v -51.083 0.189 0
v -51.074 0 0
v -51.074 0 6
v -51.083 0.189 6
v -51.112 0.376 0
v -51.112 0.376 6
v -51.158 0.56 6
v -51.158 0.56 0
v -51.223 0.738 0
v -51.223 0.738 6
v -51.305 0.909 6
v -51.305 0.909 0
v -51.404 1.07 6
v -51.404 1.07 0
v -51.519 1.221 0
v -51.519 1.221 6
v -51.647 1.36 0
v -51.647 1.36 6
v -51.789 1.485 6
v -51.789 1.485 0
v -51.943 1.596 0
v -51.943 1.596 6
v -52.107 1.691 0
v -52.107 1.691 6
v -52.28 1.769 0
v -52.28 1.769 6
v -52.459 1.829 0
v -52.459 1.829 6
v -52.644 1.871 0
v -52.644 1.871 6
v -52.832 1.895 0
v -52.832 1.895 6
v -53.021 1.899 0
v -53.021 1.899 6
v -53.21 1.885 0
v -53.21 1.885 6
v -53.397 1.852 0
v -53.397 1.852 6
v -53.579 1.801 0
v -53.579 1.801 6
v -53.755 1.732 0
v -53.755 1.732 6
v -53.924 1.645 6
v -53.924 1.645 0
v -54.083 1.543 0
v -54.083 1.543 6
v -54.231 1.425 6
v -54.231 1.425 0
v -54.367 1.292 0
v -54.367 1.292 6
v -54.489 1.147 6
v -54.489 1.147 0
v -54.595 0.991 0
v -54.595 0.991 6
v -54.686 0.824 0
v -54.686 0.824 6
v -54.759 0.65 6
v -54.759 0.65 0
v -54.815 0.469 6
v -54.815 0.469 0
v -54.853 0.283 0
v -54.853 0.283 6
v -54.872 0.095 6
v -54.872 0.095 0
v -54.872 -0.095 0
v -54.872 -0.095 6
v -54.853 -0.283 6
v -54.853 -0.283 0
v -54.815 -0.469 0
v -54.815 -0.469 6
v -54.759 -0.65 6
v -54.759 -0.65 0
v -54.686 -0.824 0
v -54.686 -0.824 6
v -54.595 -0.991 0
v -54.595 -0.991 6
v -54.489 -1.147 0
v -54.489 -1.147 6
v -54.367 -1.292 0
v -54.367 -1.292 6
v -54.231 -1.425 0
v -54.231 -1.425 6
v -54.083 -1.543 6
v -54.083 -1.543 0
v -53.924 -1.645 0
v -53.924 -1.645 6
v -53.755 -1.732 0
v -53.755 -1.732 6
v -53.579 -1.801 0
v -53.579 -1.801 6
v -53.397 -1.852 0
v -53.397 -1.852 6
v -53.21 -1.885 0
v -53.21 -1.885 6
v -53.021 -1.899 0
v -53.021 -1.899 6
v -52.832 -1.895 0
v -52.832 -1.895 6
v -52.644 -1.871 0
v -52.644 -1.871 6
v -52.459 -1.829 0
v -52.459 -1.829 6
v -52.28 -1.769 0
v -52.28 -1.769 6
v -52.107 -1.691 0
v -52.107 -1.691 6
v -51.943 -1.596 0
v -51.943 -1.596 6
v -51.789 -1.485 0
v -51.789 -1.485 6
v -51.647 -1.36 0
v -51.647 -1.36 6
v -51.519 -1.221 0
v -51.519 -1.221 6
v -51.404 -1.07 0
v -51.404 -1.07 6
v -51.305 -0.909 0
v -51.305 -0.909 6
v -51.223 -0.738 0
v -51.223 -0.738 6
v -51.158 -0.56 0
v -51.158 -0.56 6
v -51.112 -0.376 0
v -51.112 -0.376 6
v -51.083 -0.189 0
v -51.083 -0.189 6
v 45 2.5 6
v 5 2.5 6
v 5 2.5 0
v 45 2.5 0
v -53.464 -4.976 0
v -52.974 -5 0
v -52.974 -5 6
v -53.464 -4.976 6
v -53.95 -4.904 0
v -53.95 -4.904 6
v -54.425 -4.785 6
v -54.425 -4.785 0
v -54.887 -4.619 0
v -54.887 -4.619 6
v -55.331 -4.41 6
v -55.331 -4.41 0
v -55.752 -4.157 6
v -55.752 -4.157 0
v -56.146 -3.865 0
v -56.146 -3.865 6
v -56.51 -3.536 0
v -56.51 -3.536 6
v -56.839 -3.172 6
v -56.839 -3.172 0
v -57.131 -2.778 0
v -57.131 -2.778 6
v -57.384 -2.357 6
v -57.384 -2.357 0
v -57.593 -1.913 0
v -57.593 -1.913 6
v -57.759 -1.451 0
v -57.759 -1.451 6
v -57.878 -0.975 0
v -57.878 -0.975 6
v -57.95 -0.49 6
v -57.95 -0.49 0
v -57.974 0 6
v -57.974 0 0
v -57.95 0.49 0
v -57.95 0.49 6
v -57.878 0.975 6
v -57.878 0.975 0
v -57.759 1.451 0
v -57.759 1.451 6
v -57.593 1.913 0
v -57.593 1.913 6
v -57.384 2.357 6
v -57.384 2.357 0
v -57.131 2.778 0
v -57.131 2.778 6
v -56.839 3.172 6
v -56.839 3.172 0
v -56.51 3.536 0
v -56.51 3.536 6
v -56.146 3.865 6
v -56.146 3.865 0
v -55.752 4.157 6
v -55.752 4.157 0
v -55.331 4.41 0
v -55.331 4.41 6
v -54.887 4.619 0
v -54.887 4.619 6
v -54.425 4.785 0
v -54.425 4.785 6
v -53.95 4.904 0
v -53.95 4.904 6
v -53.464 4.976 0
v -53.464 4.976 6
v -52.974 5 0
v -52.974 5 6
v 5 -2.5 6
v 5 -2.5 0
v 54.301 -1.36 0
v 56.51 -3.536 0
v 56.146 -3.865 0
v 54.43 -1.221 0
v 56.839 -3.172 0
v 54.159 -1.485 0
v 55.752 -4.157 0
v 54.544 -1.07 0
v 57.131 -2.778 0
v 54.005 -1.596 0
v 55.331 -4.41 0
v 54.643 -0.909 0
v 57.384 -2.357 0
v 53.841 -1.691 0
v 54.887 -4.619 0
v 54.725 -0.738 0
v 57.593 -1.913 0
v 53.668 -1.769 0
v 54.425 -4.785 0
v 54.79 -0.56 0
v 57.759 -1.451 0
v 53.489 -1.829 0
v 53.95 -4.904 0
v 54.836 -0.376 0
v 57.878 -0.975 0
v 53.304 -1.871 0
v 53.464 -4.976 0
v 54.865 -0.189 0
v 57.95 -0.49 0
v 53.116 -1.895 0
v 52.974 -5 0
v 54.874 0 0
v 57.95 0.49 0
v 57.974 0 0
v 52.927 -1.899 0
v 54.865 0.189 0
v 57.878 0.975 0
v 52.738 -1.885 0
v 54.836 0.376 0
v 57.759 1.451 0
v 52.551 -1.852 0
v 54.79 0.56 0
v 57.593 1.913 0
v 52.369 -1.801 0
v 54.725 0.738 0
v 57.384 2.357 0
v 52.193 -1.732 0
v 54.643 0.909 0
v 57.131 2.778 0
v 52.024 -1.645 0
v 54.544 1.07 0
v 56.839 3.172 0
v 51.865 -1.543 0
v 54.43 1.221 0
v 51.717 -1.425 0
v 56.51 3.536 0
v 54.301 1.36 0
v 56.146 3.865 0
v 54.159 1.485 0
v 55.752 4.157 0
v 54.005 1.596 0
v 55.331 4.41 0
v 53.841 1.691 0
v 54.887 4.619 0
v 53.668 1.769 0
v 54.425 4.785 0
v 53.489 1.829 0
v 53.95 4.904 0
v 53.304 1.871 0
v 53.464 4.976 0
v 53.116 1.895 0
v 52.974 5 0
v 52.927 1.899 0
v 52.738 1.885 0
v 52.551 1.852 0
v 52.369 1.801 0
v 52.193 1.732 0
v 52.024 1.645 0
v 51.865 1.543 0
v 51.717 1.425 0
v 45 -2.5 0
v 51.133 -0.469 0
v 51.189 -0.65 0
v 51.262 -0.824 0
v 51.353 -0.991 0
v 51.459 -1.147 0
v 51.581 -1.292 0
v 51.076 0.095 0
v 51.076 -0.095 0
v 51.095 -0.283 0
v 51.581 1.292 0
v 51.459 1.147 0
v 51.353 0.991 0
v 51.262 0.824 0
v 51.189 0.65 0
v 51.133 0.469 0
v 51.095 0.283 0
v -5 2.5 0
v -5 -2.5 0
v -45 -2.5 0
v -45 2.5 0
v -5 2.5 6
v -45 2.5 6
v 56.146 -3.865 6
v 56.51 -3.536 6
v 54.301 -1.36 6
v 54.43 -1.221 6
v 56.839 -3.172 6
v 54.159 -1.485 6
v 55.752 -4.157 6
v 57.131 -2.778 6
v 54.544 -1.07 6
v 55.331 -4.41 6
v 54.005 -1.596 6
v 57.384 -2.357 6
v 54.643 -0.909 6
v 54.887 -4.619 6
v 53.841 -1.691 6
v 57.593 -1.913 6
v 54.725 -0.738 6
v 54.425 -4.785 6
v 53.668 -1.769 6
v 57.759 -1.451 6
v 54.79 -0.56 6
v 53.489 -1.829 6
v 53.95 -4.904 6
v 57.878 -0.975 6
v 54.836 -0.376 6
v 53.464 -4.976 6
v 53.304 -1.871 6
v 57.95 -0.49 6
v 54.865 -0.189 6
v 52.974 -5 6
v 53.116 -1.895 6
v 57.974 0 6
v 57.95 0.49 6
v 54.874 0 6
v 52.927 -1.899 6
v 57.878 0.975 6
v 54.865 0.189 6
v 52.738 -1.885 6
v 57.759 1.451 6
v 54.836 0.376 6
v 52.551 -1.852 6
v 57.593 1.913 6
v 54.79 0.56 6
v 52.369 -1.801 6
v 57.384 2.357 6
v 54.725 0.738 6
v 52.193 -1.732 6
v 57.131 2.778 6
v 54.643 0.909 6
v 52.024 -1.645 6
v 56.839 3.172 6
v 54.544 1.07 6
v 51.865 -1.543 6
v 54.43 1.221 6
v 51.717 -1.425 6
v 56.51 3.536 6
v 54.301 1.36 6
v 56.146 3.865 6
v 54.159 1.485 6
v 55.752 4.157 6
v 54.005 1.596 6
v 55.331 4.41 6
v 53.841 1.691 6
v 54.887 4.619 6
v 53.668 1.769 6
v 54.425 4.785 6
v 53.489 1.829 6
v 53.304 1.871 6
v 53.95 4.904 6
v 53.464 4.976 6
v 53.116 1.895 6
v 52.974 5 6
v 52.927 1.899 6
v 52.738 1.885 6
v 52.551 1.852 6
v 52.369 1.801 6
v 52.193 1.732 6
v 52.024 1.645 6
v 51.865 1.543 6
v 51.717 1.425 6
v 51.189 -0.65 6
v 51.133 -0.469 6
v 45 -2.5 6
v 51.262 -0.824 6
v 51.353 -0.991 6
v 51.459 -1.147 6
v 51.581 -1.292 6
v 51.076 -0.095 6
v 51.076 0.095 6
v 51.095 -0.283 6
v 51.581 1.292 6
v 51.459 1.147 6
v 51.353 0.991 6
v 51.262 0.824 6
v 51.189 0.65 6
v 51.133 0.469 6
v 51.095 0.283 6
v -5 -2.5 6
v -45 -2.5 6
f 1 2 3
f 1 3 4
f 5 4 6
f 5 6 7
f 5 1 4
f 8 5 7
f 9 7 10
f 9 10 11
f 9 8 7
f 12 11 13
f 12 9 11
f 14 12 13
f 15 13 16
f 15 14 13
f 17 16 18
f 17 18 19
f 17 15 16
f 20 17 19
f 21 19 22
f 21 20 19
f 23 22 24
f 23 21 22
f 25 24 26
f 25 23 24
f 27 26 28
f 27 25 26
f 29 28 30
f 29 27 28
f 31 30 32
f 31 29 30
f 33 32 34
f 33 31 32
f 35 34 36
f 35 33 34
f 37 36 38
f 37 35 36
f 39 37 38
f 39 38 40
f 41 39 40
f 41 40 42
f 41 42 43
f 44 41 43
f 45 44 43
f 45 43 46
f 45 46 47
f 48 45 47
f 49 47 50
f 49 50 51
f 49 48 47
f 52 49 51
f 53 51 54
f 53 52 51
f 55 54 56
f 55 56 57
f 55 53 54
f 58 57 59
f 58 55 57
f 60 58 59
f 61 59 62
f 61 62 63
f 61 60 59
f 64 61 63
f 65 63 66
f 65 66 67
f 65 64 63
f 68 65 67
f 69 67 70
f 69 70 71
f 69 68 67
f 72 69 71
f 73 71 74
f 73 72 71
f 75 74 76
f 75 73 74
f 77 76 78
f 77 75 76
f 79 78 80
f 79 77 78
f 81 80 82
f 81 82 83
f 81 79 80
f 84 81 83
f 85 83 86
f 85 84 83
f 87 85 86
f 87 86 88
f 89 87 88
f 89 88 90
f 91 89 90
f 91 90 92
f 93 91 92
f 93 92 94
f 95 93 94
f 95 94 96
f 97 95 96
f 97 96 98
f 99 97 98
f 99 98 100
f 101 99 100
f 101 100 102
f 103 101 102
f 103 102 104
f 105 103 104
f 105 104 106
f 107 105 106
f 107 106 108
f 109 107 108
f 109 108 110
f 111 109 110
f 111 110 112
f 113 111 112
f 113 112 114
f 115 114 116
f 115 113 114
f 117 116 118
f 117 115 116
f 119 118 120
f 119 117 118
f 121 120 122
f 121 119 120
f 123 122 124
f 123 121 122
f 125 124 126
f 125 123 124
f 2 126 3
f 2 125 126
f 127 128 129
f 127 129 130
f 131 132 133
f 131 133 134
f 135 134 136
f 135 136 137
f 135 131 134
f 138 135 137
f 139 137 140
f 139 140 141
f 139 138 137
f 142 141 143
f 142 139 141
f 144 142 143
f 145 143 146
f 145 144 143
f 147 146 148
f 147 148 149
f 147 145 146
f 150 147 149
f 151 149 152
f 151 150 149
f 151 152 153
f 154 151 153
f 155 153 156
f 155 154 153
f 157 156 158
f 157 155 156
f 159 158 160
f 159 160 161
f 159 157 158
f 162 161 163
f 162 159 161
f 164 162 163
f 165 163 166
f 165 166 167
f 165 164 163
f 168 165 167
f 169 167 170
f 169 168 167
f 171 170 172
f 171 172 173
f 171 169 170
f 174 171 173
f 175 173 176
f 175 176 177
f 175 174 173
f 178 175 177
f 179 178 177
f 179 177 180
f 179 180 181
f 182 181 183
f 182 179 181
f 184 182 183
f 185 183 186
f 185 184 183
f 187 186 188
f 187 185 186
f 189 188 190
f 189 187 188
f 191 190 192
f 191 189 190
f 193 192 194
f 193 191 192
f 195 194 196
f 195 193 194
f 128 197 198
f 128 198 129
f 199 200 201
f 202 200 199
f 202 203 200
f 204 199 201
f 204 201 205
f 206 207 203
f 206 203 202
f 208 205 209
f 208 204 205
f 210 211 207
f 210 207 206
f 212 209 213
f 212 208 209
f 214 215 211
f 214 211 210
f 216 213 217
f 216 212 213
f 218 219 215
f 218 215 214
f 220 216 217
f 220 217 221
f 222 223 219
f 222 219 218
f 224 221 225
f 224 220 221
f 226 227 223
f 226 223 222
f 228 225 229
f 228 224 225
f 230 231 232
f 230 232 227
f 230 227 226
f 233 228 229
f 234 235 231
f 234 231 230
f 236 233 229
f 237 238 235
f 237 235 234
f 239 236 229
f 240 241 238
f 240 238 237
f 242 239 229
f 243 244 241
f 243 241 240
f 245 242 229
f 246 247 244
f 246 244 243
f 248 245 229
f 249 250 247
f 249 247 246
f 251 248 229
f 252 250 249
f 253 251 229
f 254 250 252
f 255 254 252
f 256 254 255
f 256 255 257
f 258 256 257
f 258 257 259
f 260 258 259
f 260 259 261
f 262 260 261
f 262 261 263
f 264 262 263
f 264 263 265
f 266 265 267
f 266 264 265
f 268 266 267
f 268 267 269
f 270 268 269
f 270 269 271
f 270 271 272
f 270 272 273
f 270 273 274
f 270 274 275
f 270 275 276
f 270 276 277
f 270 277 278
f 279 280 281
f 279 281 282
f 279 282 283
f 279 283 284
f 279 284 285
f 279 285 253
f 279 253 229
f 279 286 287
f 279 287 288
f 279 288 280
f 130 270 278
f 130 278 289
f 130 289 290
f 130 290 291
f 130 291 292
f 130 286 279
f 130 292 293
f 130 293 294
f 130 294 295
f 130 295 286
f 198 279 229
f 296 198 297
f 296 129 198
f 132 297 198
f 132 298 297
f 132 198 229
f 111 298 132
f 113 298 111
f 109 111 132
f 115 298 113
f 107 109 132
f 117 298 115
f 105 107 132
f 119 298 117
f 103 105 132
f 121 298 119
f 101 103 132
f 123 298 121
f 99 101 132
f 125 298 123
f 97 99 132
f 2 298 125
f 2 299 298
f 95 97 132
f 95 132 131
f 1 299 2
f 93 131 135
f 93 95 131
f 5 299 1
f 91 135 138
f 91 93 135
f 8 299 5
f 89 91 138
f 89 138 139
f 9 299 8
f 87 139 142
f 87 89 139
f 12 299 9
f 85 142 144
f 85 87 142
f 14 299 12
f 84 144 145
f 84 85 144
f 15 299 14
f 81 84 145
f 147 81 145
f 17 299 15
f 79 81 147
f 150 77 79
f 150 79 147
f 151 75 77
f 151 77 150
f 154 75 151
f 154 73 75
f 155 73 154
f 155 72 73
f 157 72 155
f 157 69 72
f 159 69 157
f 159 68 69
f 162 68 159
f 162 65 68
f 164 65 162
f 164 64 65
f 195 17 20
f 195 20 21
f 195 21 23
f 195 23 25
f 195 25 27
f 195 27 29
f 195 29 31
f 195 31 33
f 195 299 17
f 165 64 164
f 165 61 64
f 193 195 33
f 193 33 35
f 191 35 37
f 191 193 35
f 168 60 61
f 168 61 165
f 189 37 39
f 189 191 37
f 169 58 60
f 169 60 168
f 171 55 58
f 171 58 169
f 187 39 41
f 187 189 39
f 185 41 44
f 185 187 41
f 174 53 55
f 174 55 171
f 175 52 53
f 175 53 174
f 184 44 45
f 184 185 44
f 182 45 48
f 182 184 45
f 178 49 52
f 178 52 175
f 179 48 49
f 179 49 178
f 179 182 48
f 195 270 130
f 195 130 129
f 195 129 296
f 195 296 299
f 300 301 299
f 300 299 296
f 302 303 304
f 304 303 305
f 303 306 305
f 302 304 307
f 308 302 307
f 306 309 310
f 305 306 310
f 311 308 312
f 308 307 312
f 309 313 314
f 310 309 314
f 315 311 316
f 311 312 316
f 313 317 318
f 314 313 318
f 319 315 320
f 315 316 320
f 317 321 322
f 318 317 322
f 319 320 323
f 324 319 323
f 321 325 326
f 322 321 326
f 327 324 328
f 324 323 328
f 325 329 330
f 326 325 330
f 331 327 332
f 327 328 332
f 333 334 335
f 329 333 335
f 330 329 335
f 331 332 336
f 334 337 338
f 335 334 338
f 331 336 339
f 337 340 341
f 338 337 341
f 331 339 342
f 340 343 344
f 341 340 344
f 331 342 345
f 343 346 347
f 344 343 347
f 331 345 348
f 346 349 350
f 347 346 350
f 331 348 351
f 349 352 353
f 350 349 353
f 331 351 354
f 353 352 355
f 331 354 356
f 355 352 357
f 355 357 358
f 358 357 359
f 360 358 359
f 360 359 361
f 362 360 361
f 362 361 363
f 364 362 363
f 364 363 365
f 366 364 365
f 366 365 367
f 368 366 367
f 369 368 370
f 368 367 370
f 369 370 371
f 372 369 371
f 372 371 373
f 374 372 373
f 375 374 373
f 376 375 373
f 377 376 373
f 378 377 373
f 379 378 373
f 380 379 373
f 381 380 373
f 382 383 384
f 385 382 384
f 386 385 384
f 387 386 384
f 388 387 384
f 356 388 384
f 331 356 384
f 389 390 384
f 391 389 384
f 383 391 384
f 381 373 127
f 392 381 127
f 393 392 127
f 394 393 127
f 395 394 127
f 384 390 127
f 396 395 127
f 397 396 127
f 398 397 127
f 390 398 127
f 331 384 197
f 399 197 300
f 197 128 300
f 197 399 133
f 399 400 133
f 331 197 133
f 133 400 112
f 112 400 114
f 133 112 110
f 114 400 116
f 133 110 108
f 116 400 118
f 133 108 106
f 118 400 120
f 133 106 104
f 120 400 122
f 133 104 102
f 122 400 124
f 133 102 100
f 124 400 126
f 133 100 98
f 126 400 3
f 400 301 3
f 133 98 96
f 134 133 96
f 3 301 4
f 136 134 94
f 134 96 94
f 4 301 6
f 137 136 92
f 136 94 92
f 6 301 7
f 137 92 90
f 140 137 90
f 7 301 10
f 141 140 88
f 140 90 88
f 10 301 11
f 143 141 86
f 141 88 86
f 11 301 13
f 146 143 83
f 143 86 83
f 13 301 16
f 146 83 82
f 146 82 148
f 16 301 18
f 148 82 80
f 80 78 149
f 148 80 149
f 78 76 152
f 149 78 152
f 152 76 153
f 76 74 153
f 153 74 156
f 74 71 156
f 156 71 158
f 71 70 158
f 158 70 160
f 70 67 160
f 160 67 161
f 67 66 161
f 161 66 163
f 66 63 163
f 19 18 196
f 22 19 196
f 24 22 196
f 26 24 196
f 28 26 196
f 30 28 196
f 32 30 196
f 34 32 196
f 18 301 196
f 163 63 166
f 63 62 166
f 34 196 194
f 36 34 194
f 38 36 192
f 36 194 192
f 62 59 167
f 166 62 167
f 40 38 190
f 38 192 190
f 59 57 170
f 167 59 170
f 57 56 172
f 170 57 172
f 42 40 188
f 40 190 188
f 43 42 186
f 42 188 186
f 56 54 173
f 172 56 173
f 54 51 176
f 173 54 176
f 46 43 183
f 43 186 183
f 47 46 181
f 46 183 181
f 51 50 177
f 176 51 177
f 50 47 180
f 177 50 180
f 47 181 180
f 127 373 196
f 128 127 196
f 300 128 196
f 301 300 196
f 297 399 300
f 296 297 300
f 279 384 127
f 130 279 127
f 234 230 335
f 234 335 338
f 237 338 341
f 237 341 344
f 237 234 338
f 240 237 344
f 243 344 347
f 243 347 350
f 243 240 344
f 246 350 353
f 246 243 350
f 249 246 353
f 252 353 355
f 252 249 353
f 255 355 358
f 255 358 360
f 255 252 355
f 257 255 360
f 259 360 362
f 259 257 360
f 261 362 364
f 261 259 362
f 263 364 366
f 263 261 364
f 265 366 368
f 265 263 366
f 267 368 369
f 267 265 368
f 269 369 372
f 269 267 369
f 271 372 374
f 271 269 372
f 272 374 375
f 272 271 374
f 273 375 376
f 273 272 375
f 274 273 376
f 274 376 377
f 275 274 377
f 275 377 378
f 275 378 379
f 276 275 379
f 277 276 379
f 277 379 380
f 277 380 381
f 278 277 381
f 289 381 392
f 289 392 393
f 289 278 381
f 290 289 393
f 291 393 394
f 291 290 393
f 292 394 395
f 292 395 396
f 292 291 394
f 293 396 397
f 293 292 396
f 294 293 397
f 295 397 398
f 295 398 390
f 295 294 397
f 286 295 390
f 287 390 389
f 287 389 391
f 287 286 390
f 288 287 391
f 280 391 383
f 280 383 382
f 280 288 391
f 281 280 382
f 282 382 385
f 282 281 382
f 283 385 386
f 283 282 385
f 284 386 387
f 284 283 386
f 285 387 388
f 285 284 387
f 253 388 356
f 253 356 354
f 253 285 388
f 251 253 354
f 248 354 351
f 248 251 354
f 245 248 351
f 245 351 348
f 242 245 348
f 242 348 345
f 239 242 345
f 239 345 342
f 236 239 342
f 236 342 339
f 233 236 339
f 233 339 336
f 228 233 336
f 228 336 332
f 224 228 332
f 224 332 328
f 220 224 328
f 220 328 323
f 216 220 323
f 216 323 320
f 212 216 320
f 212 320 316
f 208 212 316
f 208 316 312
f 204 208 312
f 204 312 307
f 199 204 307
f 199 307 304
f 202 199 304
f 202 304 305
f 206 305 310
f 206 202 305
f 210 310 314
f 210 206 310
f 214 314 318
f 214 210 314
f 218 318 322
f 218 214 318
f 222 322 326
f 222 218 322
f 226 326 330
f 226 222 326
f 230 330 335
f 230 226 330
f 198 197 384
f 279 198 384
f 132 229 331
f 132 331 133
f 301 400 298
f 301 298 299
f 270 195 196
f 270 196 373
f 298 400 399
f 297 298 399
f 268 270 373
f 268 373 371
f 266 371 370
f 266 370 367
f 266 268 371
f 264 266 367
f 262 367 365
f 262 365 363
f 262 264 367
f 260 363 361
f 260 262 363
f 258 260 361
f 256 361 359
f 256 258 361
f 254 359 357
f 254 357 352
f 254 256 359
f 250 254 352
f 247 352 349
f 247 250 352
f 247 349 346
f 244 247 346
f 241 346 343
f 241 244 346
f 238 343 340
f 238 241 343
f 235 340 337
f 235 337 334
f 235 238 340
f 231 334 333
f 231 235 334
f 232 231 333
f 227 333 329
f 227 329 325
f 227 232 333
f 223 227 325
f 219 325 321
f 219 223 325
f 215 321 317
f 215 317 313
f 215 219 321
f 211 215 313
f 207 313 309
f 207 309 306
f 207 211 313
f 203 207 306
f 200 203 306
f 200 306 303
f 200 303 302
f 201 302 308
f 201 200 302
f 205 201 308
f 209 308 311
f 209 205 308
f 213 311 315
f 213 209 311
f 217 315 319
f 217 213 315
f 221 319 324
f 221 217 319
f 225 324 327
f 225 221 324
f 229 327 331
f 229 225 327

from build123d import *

# Parameters (mm, degrees)
SKETCH1_R           = 1.9
BOSS_EXTRUDE1_DEPTH = 6
SKETCH2_W           = 40
SKETCH2_H           = 5
CUT_EXTRUDE1_DEPTH  = 59.49778203


with BuildPart() as part:
    # Sketch1 → Boss-Extrude1 (new body)
    with BuildSketch(Plane.XY):
        with BuildLine():
            Line((-52.97405025, 5), (52.97405025, 5))
            ThreePointArc((52.97405025, 5), (57.97405025, 0), (52.97405025, -5))
            Line((52.97405025, -5), (-52.97405025, -5))
            ThreePointArc((-52.97405025, -5), (-57.97405025, 0), (-52.97405025, 5))
        make_face()
        with Locations((-52.97405025, 0)):
            Circle(SKETCH1_R, mode=Mode.SUBTRACT)
        with Locations((52.97405025, 0)):
            Circle(SKETCH1_R, mode=Mode.SUBTRACT)
    extrude(amount=BOSS_EXTRUDE1_DEPTH)

    # Sketch2 → Cut-Extrude1 (cut, through all)
    with BuildSketch(Plane.XY.offset(6)):
        with Locations((-25, 0)):
            Rectangle(SKETCH2_W, SKETCH2_H)
        with Locations((25, 0)):
            Rectangle(SKETCH2_W, SKETCH2_H)
    extrude(amount=-CUT_EXTRUDE1_DEPTH, mode=Mode.SUBTRACT)


solid = part.part
